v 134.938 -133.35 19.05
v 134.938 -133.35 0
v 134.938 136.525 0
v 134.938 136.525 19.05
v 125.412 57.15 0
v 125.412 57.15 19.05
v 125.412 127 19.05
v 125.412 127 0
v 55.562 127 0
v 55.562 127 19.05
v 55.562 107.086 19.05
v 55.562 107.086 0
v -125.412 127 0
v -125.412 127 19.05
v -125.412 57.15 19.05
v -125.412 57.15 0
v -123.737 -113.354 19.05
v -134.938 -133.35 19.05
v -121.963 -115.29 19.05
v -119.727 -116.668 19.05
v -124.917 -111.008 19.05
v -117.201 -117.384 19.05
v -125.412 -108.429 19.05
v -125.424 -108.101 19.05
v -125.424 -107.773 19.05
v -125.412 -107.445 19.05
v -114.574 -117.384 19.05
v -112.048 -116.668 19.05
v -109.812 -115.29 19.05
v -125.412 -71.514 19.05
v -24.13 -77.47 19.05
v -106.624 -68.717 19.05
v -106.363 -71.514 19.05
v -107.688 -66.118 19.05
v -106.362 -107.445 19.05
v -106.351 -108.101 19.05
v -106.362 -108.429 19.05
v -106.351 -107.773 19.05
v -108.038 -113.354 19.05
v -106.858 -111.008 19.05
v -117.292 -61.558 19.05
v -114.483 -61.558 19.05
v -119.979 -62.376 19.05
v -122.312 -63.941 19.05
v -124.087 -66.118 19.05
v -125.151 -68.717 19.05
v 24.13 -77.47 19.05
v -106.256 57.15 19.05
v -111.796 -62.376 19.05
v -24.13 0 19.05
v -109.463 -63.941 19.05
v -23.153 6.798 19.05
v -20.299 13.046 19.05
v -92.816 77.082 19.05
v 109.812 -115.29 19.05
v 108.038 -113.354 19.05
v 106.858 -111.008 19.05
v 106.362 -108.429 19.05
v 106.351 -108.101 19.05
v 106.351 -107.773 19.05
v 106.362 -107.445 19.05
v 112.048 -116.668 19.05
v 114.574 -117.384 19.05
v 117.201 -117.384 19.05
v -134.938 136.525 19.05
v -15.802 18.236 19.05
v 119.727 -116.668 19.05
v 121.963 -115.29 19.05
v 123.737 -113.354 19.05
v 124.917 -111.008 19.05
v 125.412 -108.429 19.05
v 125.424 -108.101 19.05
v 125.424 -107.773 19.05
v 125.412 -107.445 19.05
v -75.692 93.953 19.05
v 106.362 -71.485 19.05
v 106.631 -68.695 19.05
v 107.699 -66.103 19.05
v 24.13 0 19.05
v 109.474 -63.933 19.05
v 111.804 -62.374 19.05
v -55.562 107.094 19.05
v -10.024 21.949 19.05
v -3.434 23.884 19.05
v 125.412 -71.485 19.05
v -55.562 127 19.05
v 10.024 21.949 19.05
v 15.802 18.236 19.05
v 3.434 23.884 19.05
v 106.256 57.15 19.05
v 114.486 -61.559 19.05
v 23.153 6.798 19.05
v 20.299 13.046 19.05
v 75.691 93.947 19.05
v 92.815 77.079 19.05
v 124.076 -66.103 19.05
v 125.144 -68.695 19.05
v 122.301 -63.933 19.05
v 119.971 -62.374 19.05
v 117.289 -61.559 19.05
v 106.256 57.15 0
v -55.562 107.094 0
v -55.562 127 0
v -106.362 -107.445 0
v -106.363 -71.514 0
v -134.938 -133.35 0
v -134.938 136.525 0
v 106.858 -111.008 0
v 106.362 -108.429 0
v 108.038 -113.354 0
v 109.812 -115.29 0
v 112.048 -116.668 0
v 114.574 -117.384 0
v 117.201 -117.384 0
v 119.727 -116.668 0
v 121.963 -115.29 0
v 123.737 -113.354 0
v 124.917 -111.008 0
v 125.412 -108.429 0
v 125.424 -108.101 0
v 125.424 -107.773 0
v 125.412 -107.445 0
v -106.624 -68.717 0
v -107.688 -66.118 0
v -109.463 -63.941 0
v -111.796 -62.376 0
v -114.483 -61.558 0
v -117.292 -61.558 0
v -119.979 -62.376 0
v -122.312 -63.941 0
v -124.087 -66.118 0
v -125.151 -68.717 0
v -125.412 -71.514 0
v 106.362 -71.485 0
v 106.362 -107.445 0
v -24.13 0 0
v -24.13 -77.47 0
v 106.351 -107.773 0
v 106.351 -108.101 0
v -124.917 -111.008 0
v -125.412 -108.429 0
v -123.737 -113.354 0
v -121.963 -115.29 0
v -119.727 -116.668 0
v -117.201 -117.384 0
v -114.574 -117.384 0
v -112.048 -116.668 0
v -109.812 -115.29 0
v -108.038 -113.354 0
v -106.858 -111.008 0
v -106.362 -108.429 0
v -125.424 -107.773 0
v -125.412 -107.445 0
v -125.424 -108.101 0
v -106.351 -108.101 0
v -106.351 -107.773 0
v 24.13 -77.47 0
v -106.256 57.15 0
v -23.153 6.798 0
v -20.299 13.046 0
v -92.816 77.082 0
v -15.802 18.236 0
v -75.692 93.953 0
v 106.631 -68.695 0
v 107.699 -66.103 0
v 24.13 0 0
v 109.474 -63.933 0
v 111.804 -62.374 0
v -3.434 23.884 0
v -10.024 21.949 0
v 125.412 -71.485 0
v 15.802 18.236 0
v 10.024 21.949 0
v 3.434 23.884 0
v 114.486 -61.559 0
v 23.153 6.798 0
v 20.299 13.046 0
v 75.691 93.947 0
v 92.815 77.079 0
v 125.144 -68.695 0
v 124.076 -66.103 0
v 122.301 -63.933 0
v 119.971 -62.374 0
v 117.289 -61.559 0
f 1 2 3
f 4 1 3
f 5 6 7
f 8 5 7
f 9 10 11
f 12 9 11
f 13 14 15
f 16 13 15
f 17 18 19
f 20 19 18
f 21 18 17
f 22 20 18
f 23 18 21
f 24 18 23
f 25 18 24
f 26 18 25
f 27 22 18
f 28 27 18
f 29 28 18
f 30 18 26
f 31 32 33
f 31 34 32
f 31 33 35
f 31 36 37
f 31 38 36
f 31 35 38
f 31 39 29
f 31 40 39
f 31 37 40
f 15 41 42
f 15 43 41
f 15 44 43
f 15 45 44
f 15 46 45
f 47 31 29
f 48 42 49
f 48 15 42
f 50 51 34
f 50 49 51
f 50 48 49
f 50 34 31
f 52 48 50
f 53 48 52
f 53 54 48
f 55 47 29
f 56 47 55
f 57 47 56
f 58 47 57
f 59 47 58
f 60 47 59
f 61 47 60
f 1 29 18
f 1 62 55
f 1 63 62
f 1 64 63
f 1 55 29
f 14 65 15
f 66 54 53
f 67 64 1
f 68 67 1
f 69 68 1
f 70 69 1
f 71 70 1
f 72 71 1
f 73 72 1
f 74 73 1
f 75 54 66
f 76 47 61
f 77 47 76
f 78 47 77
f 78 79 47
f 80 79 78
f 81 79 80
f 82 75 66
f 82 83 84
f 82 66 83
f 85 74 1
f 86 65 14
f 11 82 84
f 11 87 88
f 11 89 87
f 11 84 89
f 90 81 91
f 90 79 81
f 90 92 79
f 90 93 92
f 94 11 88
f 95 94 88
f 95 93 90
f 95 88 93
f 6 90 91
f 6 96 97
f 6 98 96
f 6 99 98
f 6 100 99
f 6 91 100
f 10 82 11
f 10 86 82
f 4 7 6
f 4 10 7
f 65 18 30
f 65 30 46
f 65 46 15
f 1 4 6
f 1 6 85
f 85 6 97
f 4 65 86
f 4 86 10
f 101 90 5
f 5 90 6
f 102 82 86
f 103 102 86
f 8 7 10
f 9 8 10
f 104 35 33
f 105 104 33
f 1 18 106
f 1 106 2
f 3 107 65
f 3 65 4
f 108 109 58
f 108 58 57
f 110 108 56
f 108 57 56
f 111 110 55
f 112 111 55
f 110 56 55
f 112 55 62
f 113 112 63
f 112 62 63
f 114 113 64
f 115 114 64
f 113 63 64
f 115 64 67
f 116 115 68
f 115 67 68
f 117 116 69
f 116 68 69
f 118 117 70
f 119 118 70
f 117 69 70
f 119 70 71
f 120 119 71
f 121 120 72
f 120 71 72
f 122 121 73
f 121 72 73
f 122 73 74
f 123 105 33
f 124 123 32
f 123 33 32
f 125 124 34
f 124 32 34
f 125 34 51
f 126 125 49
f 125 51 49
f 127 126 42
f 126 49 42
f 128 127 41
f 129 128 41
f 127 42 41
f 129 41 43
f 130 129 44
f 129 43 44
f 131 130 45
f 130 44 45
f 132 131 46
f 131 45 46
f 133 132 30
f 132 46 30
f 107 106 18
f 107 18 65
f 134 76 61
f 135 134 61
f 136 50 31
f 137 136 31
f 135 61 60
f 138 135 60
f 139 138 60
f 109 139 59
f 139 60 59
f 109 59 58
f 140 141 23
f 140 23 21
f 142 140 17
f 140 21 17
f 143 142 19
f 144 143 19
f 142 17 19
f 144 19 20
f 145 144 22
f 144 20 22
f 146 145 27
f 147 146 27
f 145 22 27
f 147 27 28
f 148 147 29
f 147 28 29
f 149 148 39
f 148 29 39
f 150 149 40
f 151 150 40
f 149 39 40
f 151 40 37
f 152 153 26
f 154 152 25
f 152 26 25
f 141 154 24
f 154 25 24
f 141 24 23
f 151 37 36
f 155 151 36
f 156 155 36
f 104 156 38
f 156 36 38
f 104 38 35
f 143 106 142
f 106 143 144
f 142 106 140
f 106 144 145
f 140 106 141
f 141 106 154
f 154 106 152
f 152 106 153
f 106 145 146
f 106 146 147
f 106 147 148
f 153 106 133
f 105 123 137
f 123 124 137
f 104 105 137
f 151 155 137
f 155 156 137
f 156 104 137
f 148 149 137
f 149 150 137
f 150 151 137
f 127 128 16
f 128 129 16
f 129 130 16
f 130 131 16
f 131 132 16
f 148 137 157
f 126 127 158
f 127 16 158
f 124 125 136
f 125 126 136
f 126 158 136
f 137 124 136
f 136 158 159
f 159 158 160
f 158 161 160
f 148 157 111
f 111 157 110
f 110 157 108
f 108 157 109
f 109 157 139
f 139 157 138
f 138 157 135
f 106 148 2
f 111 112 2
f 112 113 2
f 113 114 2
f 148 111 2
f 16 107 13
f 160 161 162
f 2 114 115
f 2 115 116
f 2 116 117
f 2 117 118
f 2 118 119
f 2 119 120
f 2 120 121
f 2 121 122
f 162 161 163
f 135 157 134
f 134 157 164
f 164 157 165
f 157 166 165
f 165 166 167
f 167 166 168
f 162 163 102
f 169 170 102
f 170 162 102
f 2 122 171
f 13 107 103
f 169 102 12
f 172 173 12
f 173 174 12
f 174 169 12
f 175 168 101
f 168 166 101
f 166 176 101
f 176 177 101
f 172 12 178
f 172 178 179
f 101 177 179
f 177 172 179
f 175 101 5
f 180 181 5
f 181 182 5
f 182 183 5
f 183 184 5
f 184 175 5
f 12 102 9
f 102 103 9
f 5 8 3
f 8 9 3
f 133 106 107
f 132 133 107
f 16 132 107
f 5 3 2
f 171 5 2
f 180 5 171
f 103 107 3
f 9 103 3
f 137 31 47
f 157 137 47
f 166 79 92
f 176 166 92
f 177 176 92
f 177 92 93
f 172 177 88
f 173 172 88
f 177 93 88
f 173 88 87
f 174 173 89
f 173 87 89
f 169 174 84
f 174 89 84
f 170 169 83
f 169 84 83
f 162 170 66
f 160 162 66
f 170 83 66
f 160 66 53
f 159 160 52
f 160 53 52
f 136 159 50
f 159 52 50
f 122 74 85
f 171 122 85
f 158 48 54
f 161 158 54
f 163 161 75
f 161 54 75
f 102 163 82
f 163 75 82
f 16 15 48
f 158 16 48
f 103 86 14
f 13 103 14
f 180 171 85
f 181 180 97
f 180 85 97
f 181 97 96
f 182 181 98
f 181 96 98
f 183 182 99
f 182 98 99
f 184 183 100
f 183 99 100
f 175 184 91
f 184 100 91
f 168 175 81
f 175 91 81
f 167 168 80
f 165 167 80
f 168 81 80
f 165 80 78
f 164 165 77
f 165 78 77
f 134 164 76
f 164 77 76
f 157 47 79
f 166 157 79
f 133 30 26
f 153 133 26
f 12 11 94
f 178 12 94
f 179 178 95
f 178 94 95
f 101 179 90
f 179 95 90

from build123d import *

# Parameters (mm, degrees)
F0_W     = 269.875
F0_H     = 273.05
F1_DEPTH = 19.05
F3_DEPTH = 19.05
F5_DEPTH = 19.05
F7_DEPTH = 19.05
F8_W     = 269.875
F8_H     = 3.175
F9_DEPTH = 19.05


with BuildPart() as f1:
    # F0 (on Top) → F1 (new body)
    with BuildSketch(Plane.XY):
        Rectangle(F0_W, F0_H)
    extrude(amount=F1_DEPTH)

    # F2 (on face) → F3 (cut, through all)
    with BuildSketch(Plane.XY.offset(19.05)):
        with BuildLine():
            ThreePointArc((-106.255823, 57.15), (-84.675295, 85.944848), (-55.5625, 107.094496))
            Line((-55.5625, 107.094496), (-55.5625, 127))
            Line((-55.5625, 127), (-125.4125, 127))
            Line((-125.4125, 127), (-125.4125, 57.15))
            Line((-125.4125, 57.15), (-106.255823, 57.15))
        make_face()
        with BuildLine():
            Line((125.4125, 57.15), (125.4125, 127))
            Line((125.4125, 127), (55.5625, 127))
            Line((55.5625, 127), (55.5625, 107.0864))
            ThreePointArc((55.5625, 107.0864), (84.67437, 85.94048), (106.255823, 57.15))
            Line((106.255823, 57.15), (125.4125, 57.15))
        make_face()
    extrude(amount=-F3_DEPTH, mode=Mode.SUBTRACT)

    # F4 (on face) → F5 (cut, through all)
    with BuildSketch(Plane.XY.offset(19.05)):
        with BuildLine():
            ThreePointArc((-125.4125, -107.445267), (-125.4252, -107.9373), (-125.4125, -108.429333))
            Line((-125.4125, -108.429333), (-125.4125, -107.445267))
        make_face()
        with BuildLine():
            Line((-125.4125, -107.445267), (-125.4125, -108.429333))
            ThreePointArc((-125.4125, -108.429333), (-115.8875, -117.475), (-106.3625, -108.429333))
            Line((-106.3625, -108.429333), (-106.3625, -107.445267))
            Line((-106.3625, -107.445267), (-106.3625, -71.514178))
            ThreePointArc((-106.3625, -71.514178), (-115.8875, -61.453752), (-125.4125, -71.514178))
            Line((-125.4125, -71.514178), (-125.4125, -107.445267))
        make_face()
        with BuildLine():
            Line((-106.3625, -107.445267), (-106.3625, -108.429333))
            ThreePointArc((-106.3625, -108.429333), (-106.3498, -107.9373), (-106.3625, -107.445267))
        make_face()
        with BuildLine():
            Line((106.3625, -71.485033), (106.3625, -70.993))
            Line((106.3625, -70.993), (125.4125, -70.993))
            Line((125.4125, -70.993), (125.4125, -71.485033))
            ThreePointArc((125.4125, -71.485033), (115.8875, -61.4553), (106.3625, -71.485033))
        make_face()
        with BuildLine():
            Line((125.4125, -70.993), (106.3625, -70.993))
            Line((106.3625, -70.993), (106.3625, -71.485033))
            Line((106.3625, -71.485033), (106.3625, -107.445267))
            Line((106.3625, -107.445267), (106.3625, -108.429333))
            ThreePointArc((106.3625, -108.429333), (115.8875, -117.475), (125.4125, -108.429333))
            Line((125.4125, -108.429333), (125.4125, -107.445267))
            Line((125.4125, -107.445267), (125.4125, -71.485033))
            Line((125.4125, -71.485033), (125.4125, -70.993))
        make_face()
        with BuildLine():
            Line((106.3625, -108.429333), (106.3625, -107.445267))
            ThreePointArc((106.3625, -107.445267), (106.3498, -107.9373), (106.3625, -108.429333))
        make_face()
        with BuildLine():
            ThreePointArc((125.4125, -108.429333), (125.4252, -107.9373), (125.4125, -107.445267))
            Line((125.4125, -107.445267), (125.4125, -108.429333))
        make_face()
    extrude(amount=-F5_DEPTH, mode=Mode.SUBTRACT)

    # F6 (on face) → F7 (cut, through all)
    with BuildSketch(Plane.XY.offset(19.05)):
        with BuildLine():
            Line((24.13, -77.47), (24.13, 0))
            ThreePointArc((24.13, 0), (0, 24.13), (-24.13, 0))
            Line((-24.13, 0), (-24.13, -77.47))
            Line((-24.13, -77.47), (24.13, -77.47))
        make_face()
    extrude(amount=-F7_DEPTH, mode=Mode.SUBTRACT)

    # F8 (on face) → F9 (cut, through all)
    with BuildSketch(Plane.XY.offset(19.05)):
        with Locations((0, -134.9375)):
            Rectangle(F8_W, F8_H)
    extrude(amount=-F9_DEPTH, mode=Mode.SUBTRACT)


solid = f1.part
